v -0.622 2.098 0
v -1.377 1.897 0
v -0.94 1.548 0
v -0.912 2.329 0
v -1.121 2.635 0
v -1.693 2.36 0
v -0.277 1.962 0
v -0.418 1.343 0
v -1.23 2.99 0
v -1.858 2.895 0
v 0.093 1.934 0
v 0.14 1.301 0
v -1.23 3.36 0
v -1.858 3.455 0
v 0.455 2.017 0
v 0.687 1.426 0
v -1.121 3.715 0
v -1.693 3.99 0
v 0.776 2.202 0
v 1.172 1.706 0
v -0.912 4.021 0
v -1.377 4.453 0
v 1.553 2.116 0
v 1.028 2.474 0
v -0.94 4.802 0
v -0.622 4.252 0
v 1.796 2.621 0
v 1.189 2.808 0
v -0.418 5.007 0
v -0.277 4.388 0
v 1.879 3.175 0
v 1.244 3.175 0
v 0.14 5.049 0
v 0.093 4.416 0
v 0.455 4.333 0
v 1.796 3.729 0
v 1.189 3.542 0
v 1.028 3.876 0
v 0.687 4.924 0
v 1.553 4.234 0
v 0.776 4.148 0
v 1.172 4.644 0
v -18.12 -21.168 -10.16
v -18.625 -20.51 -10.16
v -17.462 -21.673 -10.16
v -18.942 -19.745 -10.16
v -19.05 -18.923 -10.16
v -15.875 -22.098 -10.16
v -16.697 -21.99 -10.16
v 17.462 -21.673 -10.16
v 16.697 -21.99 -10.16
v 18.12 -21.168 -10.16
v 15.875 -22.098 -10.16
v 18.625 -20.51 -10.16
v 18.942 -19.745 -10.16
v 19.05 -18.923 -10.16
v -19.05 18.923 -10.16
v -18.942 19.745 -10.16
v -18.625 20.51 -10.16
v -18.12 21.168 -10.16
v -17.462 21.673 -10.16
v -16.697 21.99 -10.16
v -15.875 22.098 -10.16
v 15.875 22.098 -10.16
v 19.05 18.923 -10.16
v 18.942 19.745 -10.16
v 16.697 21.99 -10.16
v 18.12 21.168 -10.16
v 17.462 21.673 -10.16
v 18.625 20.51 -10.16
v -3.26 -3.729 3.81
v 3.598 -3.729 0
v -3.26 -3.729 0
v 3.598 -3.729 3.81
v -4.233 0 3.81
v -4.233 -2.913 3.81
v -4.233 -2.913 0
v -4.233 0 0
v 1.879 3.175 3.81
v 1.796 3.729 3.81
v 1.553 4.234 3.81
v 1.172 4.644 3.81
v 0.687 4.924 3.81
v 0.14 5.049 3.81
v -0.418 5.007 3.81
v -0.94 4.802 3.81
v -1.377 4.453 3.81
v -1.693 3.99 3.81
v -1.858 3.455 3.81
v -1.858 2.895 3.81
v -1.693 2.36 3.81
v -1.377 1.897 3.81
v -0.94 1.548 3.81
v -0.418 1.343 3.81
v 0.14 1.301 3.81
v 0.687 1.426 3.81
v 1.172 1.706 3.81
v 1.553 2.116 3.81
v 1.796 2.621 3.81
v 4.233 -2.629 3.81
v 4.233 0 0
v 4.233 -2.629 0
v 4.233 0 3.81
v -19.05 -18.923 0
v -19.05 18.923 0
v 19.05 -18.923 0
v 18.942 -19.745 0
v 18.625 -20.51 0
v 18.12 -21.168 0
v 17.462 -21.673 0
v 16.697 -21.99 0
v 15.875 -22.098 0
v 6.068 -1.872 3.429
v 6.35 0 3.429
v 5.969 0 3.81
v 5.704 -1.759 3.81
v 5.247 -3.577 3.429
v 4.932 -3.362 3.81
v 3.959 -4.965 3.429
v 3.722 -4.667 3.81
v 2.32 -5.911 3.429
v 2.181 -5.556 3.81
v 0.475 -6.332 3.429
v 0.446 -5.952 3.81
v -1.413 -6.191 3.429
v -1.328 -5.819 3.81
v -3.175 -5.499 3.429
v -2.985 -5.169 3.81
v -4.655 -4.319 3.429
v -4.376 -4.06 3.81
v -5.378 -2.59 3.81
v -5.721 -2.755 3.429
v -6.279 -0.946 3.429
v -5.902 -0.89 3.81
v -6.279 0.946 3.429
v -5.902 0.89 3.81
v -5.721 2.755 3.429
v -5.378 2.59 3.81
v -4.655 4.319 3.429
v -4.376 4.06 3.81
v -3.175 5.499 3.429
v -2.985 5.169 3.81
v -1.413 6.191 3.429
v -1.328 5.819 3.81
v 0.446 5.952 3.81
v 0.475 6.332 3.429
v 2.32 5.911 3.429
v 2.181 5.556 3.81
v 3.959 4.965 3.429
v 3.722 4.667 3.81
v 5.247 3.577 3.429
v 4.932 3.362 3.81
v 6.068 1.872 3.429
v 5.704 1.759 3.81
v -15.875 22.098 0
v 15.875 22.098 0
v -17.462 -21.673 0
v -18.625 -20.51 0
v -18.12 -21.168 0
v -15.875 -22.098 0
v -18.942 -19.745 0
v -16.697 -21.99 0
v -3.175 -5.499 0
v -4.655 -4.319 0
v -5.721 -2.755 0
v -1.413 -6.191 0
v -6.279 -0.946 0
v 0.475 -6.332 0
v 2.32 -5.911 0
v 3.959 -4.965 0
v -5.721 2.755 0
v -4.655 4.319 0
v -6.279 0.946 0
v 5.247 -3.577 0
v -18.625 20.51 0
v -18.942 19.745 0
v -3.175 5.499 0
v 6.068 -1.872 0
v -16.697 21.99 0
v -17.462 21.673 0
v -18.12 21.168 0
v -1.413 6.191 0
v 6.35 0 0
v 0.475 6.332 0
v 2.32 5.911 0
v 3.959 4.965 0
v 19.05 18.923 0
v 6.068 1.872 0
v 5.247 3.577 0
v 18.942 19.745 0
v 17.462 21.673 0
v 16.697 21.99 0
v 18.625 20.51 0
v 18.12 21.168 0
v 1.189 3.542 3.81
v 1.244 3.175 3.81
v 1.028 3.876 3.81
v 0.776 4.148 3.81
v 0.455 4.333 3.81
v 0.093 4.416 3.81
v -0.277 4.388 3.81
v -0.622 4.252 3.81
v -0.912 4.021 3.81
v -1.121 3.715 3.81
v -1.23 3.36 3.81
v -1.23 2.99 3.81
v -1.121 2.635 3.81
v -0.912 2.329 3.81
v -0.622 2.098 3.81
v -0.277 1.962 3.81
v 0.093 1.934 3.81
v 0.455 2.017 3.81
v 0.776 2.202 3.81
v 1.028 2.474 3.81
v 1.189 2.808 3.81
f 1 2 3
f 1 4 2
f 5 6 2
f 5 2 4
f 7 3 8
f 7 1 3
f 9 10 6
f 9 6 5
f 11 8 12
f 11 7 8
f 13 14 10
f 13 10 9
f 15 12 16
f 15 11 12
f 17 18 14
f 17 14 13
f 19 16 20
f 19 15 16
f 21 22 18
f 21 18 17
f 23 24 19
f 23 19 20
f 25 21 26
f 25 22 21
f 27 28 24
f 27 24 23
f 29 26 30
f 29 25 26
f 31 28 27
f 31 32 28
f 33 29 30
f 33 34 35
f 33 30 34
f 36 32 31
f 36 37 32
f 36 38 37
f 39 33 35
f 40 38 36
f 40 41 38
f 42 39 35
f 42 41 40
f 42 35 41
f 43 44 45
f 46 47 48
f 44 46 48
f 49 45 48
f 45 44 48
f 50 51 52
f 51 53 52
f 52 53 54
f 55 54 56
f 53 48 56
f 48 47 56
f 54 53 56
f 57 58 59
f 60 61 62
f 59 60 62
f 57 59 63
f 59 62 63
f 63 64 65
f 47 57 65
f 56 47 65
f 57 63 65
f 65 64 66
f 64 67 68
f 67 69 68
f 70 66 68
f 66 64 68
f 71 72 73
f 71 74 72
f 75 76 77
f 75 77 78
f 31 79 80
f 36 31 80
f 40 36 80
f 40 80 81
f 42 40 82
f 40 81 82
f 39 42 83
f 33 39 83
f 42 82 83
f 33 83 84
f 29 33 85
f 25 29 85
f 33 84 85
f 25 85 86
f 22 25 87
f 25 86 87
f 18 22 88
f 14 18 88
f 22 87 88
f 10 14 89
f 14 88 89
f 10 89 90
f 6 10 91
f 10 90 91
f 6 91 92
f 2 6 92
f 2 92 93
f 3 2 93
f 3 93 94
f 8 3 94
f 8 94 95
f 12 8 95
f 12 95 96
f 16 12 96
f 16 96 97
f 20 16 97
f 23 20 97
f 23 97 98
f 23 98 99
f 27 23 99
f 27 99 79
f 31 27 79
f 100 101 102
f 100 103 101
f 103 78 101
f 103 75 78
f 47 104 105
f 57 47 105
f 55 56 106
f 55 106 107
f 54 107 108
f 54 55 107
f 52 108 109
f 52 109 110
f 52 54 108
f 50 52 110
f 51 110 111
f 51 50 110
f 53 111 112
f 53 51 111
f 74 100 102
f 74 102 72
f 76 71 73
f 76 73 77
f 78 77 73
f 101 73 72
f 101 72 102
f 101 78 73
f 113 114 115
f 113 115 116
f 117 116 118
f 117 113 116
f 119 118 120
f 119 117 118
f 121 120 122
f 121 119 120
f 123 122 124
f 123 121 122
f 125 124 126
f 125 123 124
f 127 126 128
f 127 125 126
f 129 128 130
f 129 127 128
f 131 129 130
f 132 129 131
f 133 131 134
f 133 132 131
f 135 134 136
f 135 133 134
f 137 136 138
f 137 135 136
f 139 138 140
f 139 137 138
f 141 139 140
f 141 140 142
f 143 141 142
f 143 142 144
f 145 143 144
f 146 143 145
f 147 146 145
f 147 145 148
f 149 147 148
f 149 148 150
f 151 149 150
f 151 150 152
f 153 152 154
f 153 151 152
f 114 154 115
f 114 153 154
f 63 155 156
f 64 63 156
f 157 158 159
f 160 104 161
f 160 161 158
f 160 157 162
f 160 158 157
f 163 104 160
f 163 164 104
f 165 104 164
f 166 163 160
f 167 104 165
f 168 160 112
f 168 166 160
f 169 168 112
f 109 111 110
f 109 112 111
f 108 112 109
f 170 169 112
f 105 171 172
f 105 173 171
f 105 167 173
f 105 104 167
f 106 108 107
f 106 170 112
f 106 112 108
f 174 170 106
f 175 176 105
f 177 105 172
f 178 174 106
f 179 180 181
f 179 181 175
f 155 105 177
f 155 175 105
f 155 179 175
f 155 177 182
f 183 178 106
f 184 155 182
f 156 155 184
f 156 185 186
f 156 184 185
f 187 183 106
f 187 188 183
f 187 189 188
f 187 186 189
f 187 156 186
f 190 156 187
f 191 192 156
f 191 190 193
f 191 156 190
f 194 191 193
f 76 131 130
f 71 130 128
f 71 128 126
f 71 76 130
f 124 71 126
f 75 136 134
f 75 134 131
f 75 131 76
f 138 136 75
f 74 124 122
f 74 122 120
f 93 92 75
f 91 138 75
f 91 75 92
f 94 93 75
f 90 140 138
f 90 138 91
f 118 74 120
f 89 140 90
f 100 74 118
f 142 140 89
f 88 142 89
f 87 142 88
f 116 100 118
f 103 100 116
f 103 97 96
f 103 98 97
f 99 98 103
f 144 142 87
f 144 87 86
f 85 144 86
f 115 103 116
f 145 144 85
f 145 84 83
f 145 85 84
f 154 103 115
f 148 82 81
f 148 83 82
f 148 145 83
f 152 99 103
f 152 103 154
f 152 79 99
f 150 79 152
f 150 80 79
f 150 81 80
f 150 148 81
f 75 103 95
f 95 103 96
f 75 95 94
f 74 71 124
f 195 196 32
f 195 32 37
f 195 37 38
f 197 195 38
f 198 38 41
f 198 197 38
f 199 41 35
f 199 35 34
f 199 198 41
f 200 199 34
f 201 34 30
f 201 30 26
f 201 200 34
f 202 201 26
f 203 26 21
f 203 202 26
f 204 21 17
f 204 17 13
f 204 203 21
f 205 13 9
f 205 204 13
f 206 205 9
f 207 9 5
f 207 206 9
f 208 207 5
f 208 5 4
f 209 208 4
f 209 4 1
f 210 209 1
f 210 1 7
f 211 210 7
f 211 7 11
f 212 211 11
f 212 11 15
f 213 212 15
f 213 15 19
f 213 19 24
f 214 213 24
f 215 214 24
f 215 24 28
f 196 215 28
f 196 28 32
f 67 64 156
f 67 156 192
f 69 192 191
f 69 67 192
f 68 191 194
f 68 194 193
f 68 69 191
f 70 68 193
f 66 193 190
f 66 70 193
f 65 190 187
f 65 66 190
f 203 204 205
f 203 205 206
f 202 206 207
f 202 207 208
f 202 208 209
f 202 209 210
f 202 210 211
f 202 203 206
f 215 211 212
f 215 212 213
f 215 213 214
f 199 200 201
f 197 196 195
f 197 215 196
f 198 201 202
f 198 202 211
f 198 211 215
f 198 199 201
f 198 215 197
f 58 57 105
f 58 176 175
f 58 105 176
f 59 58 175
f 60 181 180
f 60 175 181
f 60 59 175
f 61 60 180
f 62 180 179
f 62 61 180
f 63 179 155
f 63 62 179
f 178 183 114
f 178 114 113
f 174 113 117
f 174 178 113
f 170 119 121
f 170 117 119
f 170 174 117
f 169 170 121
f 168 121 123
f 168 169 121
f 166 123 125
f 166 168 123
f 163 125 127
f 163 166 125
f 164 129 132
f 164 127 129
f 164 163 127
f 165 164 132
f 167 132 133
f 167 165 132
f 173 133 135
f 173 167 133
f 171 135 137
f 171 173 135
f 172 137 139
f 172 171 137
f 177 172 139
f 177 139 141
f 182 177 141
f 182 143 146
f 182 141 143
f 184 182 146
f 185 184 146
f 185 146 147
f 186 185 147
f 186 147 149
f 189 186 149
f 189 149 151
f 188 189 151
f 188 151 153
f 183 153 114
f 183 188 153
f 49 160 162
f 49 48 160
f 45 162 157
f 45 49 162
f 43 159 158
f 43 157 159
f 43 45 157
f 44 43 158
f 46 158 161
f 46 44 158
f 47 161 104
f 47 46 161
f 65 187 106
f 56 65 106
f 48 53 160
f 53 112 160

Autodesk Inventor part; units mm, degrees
ref_plane "YZ Plane" through (0, 0, 0) normal (1, 0, 0) x (0, 1, 0)
ref_plane "XZ Plane" through (0, 0, 0) normal (0, 1, 0) x (-1, 0, 0)
ref_plane "XY Plane" through (0, 0, 0) normal (0, 0, 1) x (1, 0, 0)
sketch "FishmanBattery" plane through (0, 0, 0) normal (0, 0, 1) x (1, 0, 0)
  line L0 (-19.05, 22.098) -> (19.05, 22.098)
  line L1 (19.05, 22.098) -> (19.05, -22.098)
  line L2 (19.05, -22.098) -> (-19.05, -22.098)
  line L3 (-19.05, -22.098) -> (-19.05, 22.098)
  circle A0 centre (0, 0) radius 6.35
  line L4 (0, 22.098) -> (0, -22.098) construction
  line L5 (-19.05, 0) -> (19.05, 0) construction
  point P0 (0, 0)
  point P1 (0, 0)
  dimension "d13" = 38.1
  dimension "d14" = 44.196
  dimension "d26" = 12.7
extrude "FishmanBatteryFeature" add sketch "FishmanBattery" against normal blind 10.16 contours L0 L1 L2 L3 | A0
extrude "FishmanBatteryConnectorFeature" add sketch "FishmanBattery" along normal blind 3.81 contours A0
chamfer "FishmanBatteryChamferFeature" distance 0.381 angle 45 1 edges at (-6.35, 0, 3.81)
fillet "FishmanBatteryFilletsFeature" radius 3.175 4 edges at (19.05, 22.098, -5.08) (19.05, -22.098, -5.08) (-19.05, -22.098, -5.08) (-19.05, 22.098, -5.08)
sketch "FishmanConnector" plane through (0, 0, 3.81) normal (0, 0, 1) x (1, 0, 0)
  circle A0 centre (0, 3.175) radius 1.8791
  circle A1 centre (0, 3.175) radius 1.2441
  line L0 (-4.2333, 0) -> (4.2333, 0)
  line L1 (4.2333, 0) -> (4.2333, -2.6291)
  line L2 (4.2333, -2.6291) -> (3.5983, -3.729)
  line L3 (3.5983, -3.729) -> (-3.2605, -3.729)
  line L4 (-3.2605, -3.729) -> (-4.2333, -2.9126)
  line L5 (-4.2333, -2.9126) -> (-4.2333, 0)
  line L6 (0, -30.9372) -> (0, 30.9372) construction
  point P0 (0, 0)
  point P1 (0, 0)
  dimension "d133" = 3.729
  dimension "d134" = 8.4667
  dimension "d135" = 3.7582
  dimension "d136" = 0.635
  dimension "d137" = 150
  dimension "d138" = 140
  dimension "d139" = 1.27
  dimension "d141" = 3.175
extrude "FishmanConnectorHolesFeature" cut sketch "FishmanConnector" against normal blind 3.81
properties part number "fishman-battery"
